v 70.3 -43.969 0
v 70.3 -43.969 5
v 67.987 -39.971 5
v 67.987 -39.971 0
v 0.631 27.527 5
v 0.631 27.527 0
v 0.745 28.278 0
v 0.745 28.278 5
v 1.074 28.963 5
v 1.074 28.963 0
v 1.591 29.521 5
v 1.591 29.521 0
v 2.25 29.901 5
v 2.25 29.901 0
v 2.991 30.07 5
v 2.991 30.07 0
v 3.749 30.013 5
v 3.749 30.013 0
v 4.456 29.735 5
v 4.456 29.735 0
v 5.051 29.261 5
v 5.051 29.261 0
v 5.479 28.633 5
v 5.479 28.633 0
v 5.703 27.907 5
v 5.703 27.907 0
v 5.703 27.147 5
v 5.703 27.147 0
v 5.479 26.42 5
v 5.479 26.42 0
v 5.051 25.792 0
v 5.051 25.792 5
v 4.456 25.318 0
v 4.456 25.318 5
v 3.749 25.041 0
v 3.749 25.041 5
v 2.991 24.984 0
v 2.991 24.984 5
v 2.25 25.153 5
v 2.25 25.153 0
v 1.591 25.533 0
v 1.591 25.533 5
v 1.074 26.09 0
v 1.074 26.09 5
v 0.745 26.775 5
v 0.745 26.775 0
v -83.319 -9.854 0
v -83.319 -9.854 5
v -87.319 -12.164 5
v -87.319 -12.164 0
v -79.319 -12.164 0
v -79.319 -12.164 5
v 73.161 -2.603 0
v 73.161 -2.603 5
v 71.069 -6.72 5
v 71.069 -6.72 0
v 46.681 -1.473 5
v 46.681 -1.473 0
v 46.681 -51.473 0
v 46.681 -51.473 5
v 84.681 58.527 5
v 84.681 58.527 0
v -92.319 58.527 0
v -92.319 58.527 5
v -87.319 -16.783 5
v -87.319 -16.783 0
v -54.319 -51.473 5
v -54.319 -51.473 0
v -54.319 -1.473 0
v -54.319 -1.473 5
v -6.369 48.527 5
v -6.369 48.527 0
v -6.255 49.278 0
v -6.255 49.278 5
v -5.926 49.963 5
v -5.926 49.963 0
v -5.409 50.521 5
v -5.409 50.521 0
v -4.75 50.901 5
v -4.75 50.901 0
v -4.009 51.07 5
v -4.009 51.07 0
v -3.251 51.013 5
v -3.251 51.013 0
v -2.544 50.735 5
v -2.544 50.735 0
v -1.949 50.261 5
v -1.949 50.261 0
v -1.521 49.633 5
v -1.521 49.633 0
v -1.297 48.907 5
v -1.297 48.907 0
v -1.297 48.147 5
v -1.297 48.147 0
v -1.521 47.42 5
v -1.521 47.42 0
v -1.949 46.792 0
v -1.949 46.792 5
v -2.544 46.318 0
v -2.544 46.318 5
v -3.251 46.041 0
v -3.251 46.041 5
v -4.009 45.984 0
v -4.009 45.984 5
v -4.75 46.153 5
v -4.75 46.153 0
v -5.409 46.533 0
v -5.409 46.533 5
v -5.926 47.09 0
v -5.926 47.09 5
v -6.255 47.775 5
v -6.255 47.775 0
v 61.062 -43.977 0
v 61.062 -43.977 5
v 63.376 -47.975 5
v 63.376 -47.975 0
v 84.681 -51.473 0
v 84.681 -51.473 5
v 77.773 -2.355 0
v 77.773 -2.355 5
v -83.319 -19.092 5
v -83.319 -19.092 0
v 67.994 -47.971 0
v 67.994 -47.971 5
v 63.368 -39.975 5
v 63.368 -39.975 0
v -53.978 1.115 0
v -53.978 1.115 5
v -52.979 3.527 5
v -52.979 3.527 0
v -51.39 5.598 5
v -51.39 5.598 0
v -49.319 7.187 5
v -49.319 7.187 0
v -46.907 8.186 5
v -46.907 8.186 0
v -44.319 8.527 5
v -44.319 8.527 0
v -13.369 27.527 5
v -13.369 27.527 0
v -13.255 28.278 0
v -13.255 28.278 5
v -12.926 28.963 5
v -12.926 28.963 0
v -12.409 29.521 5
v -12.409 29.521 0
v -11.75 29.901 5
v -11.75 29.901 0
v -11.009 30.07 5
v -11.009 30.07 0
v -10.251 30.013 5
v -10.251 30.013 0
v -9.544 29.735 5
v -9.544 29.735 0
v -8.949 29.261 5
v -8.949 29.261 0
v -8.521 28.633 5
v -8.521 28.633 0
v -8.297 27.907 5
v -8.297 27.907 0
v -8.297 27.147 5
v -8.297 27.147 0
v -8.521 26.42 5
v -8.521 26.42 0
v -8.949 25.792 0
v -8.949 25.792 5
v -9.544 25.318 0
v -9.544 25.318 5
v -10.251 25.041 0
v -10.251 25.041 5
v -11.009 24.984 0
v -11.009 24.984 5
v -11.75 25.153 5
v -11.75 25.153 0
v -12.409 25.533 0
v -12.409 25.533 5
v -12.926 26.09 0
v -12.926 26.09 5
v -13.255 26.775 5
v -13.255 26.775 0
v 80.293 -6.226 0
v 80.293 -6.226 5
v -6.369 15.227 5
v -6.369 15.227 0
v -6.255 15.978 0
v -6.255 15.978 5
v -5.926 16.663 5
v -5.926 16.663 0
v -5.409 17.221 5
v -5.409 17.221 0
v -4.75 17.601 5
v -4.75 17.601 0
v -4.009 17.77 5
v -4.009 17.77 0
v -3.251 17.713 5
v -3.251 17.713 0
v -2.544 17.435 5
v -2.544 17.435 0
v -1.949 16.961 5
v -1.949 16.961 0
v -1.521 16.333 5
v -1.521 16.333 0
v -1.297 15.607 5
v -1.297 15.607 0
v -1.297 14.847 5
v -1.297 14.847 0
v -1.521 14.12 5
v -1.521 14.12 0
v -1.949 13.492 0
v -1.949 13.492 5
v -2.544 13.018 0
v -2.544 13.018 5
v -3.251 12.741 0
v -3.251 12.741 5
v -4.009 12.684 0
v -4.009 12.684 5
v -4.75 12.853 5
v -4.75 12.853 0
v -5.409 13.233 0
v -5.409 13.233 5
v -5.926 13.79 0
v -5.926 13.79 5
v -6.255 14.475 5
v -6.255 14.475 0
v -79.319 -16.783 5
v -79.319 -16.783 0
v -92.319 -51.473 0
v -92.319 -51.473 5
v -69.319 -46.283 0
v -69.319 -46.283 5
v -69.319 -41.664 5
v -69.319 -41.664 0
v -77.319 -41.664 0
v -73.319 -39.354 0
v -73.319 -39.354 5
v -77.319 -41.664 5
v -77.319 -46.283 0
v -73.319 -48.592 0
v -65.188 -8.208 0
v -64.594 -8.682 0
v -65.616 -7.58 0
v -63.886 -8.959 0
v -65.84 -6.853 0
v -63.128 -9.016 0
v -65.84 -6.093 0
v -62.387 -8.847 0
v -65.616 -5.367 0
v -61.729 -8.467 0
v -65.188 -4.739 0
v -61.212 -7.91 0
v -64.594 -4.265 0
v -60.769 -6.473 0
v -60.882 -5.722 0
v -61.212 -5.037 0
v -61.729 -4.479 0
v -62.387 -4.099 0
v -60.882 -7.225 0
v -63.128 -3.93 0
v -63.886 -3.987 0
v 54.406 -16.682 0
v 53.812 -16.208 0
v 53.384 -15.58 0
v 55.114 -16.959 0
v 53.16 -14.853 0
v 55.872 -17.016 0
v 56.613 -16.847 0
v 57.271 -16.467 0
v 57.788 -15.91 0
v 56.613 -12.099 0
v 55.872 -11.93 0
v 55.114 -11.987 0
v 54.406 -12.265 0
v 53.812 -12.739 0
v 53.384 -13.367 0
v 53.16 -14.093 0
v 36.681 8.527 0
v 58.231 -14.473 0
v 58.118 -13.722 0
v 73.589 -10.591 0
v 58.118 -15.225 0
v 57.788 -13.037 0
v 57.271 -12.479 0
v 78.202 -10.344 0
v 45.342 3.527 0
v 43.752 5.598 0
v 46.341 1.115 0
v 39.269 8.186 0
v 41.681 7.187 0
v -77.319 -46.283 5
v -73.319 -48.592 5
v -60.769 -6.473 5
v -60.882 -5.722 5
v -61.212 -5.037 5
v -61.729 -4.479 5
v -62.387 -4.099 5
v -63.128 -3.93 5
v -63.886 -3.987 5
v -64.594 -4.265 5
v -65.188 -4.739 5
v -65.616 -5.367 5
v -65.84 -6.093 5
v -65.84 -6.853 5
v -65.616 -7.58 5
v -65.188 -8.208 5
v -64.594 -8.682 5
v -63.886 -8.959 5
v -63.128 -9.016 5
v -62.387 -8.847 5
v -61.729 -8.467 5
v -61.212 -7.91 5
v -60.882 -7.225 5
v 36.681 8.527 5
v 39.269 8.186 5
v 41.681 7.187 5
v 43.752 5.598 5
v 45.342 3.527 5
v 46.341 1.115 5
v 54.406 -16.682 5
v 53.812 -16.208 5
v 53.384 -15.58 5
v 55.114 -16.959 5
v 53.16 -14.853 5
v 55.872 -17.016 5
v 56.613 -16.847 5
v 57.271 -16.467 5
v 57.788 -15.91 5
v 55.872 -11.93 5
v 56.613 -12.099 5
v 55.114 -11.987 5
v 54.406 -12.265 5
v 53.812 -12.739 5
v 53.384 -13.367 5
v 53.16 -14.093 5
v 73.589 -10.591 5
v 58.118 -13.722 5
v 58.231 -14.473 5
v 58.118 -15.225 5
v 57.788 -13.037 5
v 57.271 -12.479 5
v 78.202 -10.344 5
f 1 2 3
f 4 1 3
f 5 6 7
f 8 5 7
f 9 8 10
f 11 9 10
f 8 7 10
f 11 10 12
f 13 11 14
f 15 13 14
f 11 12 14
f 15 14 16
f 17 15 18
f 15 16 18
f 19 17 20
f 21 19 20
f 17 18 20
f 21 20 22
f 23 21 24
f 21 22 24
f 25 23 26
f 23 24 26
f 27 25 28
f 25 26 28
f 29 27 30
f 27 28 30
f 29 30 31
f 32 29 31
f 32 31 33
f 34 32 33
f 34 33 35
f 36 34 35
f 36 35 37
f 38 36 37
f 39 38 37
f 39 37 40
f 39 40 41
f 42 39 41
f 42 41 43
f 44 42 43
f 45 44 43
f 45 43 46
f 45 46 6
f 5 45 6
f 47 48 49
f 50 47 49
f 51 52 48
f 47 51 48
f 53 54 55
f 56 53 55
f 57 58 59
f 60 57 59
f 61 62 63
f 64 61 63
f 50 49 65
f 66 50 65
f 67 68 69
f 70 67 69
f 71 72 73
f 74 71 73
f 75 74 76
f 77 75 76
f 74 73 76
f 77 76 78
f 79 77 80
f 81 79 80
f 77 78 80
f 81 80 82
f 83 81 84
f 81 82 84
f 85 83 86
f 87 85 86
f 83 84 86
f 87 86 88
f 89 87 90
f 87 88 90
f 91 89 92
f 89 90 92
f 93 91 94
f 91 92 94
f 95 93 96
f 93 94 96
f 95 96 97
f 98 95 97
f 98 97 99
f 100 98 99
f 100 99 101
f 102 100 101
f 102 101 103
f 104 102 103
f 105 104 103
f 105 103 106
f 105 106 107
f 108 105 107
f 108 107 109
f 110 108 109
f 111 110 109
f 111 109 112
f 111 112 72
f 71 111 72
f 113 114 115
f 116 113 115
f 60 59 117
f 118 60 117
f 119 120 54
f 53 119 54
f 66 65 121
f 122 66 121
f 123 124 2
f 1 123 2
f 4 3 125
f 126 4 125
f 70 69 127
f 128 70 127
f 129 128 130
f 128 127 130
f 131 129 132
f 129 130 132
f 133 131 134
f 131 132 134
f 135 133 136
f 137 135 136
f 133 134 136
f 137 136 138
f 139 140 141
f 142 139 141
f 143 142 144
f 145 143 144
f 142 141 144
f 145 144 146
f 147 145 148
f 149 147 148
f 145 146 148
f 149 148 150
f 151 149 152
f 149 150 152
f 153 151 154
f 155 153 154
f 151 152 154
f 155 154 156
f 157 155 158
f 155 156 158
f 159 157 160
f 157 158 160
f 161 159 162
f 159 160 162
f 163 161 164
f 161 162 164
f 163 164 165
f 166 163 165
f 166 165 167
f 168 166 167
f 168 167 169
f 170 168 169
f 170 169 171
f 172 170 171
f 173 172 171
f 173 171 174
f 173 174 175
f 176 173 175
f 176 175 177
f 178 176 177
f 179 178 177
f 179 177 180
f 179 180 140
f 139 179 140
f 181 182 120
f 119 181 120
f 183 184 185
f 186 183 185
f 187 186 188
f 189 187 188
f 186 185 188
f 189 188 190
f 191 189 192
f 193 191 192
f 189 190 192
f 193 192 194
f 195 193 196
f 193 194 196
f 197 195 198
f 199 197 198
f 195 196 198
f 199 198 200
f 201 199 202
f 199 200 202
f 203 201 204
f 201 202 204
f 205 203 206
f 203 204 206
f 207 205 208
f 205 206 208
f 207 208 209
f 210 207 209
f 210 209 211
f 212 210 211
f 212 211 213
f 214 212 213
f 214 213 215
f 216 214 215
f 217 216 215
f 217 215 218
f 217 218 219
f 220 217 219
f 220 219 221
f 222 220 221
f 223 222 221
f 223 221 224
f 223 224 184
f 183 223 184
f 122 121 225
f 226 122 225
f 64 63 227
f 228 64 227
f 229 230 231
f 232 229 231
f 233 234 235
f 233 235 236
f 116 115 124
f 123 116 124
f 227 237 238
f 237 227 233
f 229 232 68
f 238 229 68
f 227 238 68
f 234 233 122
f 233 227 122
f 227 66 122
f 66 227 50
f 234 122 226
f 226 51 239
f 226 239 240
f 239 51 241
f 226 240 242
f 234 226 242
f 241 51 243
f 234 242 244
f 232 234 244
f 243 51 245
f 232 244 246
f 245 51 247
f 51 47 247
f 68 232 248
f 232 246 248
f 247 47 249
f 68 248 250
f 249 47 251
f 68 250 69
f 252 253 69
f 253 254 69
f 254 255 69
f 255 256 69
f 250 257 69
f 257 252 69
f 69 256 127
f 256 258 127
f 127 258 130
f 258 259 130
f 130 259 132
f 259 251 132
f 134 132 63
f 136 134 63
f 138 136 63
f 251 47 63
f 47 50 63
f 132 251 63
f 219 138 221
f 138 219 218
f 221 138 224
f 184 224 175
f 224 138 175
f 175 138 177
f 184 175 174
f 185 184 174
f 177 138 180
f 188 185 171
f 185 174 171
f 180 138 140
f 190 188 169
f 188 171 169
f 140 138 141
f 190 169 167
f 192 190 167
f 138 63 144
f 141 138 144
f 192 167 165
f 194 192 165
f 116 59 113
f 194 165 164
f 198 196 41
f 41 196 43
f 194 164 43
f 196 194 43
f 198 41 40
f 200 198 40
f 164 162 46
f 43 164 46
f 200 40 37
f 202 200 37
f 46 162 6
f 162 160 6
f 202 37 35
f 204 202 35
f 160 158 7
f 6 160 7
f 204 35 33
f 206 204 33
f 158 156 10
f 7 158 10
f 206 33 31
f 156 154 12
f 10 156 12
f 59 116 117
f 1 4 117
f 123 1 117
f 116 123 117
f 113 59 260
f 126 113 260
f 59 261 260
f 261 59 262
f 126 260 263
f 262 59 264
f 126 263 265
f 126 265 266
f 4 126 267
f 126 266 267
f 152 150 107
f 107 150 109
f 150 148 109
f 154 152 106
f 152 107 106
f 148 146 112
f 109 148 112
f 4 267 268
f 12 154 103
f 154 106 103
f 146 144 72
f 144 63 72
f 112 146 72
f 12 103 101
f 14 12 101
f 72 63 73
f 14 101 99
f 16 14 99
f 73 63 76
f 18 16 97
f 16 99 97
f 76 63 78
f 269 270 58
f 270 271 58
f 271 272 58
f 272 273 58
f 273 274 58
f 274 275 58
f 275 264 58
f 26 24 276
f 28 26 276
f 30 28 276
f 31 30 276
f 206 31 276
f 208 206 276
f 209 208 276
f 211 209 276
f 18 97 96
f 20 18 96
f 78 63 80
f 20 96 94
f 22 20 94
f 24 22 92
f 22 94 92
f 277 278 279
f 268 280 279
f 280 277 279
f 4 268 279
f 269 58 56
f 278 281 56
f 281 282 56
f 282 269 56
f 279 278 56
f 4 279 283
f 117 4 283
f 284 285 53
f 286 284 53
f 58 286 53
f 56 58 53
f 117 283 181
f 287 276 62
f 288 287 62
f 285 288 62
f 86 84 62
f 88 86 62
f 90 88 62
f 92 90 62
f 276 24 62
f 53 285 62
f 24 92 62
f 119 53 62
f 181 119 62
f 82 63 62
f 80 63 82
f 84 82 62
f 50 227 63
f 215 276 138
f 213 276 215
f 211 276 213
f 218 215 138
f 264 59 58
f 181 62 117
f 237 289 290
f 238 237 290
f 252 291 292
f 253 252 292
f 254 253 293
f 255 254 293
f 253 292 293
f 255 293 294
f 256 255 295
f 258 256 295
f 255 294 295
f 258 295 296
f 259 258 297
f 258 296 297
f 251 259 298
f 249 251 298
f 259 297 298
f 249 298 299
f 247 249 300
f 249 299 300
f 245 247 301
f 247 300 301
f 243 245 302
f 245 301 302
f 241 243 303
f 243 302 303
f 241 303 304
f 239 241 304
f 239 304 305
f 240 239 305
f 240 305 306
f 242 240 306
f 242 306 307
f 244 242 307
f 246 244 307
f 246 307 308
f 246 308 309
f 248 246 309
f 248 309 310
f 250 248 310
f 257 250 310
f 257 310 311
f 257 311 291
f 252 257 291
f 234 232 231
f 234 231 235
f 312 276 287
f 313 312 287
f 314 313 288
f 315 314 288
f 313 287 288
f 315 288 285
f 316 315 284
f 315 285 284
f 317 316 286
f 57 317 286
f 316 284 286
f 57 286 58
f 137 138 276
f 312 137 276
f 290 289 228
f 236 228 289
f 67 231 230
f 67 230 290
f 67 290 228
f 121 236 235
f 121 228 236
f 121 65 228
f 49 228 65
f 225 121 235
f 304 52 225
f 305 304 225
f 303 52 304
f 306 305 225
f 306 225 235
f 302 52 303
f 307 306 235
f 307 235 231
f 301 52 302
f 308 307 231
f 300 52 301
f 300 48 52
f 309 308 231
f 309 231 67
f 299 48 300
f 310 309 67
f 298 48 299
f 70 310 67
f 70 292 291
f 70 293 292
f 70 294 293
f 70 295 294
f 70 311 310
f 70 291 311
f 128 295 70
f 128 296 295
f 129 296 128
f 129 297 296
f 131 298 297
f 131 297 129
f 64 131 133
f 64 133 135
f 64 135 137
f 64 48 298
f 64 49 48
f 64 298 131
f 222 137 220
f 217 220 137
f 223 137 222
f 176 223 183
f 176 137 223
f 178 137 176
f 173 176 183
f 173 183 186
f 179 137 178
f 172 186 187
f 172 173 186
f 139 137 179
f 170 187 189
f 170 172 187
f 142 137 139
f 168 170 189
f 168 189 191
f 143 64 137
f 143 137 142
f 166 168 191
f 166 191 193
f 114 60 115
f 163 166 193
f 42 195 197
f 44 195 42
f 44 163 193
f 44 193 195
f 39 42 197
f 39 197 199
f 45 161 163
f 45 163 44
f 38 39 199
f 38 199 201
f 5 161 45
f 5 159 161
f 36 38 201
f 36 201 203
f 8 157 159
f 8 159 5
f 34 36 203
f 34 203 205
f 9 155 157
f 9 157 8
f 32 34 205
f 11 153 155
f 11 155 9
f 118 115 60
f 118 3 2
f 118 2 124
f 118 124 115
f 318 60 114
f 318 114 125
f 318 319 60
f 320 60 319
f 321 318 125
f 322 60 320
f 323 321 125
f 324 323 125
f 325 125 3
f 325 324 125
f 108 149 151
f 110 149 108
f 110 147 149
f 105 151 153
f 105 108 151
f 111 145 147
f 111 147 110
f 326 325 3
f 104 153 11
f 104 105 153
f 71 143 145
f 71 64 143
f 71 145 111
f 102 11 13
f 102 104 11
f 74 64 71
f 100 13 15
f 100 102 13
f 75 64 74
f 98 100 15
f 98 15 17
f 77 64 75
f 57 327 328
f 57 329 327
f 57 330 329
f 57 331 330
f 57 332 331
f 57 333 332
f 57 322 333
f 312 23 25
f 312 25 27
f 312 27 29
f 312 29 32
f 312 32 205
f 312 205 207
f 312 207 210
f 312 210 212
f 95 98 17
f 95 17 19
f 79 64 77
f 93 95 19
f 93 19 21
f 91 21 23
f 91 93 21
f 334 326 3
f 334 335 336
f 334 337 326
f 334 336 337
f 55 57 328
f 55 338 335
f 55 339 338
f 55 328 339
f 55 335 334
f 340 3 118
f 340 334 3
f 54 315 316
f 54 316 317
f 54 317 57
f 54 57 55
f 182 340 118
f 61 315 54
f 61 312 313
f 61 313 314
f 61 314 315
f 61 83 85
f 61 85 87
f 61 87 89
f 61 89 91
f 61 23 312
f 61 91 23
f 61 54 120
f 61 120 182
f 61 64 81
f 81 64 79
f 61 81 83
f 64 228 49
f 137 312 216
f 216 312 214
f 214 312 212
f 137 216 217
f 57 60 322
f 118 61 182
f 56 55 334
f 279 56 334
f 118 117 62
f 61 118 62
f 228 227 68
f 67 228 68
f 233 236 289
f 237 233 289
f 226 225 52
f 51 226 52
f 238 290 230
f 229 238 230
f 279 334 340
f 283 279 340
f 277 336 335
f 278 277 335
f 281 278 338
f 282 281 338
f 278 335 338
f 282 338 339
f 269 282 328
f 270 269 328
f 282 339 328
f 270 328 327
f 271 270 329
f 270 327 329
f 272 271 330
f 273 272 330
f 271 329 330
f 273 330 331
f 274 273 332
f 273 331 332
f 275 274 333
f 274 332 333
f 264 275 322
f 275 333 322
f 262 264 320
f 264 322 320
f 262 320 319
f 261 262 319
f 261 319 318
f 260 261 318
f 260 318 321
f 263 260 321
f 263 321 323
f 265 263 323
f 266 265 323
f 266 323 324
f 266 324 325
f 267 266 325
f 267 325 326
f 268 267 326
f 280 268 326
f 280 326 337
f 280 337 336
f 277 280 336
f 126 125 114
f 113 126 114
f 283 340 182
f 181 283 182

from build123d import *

# Parameters (mm, degrees)
F1_DEPTH = 5
F3_D     = 5.1
F4_R     = 2.55
F5_DEPTH = 25


with BuildPart() as f1:
    # F0 (on Top) → F1 (new body)
    with BuildSketch(Plane.XY):
        with BuildLine():
            Line((84.6812899327, 58.5268347502), (-92.3187100673, 58.5268347502))
            Line((-92.3187100673, 58.5268347502), (-92.3187100673, 8.5268347502))
            Line((-92.3187100673, 8.5268347502), (-92.3187100673, -51.4731652498))
            Line((-92.3187100673, -51.4731652498), (-54.3187100673, -51.4731652498))
            Line((-54.3187100673, -51.4731652498), (-54.3187100673, -1.4731652498))
            ThreePointArc((-54.3187100673, -1.4731652498), (-51.3897778791, 5.597902562), (-44.3187100673, 8.5268347502))
            Line((-44.3187100673, 8.5268347502), (36.6812899327, 8.5268347502))
            ThreePointArc((36.6812899327, 8.5268347502), (43.7523577446, 5.597902562), (46.6812899327, -1.4731652498))
            Line((46.6812899327, -1.4731652498), (46.6812899327, -51.4731652498))
            Line((46.6812899327, -51.4731652498), (84.6812899327, -51.4731652498))
            Line((84.6812899327, -51.4731652498), (84.6812899327, 8.5268347502))
            Line((84.6812899327, 8.5268347502), (84.6812899327, 58.5268347502))
        make_face()
    extrude(amount=F1_DEPTH)

    # F3 (through all)
    with Locations(Plane.XY.offset(5)):
        with Locations((-10.8187100673, 27.5268347502), (-3.8187100673, 48.5268347502), (3.1812899327, 27.5268347502), (-3.8187100673, 15.2268347502)):
            Hole(F3_D / 2)

    # F4 (on face) → F5 (cut)
    with BuildSketch(Plane.XY.offset(5)):
        Polygon((-79.3187100673, -16.7825663266), (-79.3187100673, -12.1637641731), (-83.3187100673, -9.8543630963), (-87.3187100673, -12.1637641731), (-87.3187100673, -16.7825663266), (-83.3187100673, -19.0919674033), align=None)
        Polygon((-69.3187100673, -46.2825663266), (-69.3187100673, -41.6637641731), (-73.3187100673, -39.3543630963), (-77.3187100673, -41.6637641731), (-77.3187100673, -46.2825663266), (-73.3187100673, -48.5919674033), align=None)
        Polygon((71.0691113787, -6.7204349793), (73.589342523, -10.5910639091), (78.201521077, -10.3437941797), (80.2934684868, -6.2258955204), (77.7732373424, -2.3552665905), (73.1610587884, -2.60253632), align=None)
        Polygon((70.3000901599, -43.9689468335), (67.9870367906, -39.9710577099), (63.3682365634, -39.9752761263), (61.0624897056, -43.9773836662), (63.3755430749, -47.9752727897), (67.994343302, -47.9710543734), align=None)
        with Locations((-63.3187100673, -6.4731652498)):
            Circle(F4_R)
        with Locations((55.6812899327, -14.4731652498)):
            Circle(F4_R)
    extrude(amount=-F5_DEPTH, mode=Mode.SUBTRACT)


solid = f1.part
